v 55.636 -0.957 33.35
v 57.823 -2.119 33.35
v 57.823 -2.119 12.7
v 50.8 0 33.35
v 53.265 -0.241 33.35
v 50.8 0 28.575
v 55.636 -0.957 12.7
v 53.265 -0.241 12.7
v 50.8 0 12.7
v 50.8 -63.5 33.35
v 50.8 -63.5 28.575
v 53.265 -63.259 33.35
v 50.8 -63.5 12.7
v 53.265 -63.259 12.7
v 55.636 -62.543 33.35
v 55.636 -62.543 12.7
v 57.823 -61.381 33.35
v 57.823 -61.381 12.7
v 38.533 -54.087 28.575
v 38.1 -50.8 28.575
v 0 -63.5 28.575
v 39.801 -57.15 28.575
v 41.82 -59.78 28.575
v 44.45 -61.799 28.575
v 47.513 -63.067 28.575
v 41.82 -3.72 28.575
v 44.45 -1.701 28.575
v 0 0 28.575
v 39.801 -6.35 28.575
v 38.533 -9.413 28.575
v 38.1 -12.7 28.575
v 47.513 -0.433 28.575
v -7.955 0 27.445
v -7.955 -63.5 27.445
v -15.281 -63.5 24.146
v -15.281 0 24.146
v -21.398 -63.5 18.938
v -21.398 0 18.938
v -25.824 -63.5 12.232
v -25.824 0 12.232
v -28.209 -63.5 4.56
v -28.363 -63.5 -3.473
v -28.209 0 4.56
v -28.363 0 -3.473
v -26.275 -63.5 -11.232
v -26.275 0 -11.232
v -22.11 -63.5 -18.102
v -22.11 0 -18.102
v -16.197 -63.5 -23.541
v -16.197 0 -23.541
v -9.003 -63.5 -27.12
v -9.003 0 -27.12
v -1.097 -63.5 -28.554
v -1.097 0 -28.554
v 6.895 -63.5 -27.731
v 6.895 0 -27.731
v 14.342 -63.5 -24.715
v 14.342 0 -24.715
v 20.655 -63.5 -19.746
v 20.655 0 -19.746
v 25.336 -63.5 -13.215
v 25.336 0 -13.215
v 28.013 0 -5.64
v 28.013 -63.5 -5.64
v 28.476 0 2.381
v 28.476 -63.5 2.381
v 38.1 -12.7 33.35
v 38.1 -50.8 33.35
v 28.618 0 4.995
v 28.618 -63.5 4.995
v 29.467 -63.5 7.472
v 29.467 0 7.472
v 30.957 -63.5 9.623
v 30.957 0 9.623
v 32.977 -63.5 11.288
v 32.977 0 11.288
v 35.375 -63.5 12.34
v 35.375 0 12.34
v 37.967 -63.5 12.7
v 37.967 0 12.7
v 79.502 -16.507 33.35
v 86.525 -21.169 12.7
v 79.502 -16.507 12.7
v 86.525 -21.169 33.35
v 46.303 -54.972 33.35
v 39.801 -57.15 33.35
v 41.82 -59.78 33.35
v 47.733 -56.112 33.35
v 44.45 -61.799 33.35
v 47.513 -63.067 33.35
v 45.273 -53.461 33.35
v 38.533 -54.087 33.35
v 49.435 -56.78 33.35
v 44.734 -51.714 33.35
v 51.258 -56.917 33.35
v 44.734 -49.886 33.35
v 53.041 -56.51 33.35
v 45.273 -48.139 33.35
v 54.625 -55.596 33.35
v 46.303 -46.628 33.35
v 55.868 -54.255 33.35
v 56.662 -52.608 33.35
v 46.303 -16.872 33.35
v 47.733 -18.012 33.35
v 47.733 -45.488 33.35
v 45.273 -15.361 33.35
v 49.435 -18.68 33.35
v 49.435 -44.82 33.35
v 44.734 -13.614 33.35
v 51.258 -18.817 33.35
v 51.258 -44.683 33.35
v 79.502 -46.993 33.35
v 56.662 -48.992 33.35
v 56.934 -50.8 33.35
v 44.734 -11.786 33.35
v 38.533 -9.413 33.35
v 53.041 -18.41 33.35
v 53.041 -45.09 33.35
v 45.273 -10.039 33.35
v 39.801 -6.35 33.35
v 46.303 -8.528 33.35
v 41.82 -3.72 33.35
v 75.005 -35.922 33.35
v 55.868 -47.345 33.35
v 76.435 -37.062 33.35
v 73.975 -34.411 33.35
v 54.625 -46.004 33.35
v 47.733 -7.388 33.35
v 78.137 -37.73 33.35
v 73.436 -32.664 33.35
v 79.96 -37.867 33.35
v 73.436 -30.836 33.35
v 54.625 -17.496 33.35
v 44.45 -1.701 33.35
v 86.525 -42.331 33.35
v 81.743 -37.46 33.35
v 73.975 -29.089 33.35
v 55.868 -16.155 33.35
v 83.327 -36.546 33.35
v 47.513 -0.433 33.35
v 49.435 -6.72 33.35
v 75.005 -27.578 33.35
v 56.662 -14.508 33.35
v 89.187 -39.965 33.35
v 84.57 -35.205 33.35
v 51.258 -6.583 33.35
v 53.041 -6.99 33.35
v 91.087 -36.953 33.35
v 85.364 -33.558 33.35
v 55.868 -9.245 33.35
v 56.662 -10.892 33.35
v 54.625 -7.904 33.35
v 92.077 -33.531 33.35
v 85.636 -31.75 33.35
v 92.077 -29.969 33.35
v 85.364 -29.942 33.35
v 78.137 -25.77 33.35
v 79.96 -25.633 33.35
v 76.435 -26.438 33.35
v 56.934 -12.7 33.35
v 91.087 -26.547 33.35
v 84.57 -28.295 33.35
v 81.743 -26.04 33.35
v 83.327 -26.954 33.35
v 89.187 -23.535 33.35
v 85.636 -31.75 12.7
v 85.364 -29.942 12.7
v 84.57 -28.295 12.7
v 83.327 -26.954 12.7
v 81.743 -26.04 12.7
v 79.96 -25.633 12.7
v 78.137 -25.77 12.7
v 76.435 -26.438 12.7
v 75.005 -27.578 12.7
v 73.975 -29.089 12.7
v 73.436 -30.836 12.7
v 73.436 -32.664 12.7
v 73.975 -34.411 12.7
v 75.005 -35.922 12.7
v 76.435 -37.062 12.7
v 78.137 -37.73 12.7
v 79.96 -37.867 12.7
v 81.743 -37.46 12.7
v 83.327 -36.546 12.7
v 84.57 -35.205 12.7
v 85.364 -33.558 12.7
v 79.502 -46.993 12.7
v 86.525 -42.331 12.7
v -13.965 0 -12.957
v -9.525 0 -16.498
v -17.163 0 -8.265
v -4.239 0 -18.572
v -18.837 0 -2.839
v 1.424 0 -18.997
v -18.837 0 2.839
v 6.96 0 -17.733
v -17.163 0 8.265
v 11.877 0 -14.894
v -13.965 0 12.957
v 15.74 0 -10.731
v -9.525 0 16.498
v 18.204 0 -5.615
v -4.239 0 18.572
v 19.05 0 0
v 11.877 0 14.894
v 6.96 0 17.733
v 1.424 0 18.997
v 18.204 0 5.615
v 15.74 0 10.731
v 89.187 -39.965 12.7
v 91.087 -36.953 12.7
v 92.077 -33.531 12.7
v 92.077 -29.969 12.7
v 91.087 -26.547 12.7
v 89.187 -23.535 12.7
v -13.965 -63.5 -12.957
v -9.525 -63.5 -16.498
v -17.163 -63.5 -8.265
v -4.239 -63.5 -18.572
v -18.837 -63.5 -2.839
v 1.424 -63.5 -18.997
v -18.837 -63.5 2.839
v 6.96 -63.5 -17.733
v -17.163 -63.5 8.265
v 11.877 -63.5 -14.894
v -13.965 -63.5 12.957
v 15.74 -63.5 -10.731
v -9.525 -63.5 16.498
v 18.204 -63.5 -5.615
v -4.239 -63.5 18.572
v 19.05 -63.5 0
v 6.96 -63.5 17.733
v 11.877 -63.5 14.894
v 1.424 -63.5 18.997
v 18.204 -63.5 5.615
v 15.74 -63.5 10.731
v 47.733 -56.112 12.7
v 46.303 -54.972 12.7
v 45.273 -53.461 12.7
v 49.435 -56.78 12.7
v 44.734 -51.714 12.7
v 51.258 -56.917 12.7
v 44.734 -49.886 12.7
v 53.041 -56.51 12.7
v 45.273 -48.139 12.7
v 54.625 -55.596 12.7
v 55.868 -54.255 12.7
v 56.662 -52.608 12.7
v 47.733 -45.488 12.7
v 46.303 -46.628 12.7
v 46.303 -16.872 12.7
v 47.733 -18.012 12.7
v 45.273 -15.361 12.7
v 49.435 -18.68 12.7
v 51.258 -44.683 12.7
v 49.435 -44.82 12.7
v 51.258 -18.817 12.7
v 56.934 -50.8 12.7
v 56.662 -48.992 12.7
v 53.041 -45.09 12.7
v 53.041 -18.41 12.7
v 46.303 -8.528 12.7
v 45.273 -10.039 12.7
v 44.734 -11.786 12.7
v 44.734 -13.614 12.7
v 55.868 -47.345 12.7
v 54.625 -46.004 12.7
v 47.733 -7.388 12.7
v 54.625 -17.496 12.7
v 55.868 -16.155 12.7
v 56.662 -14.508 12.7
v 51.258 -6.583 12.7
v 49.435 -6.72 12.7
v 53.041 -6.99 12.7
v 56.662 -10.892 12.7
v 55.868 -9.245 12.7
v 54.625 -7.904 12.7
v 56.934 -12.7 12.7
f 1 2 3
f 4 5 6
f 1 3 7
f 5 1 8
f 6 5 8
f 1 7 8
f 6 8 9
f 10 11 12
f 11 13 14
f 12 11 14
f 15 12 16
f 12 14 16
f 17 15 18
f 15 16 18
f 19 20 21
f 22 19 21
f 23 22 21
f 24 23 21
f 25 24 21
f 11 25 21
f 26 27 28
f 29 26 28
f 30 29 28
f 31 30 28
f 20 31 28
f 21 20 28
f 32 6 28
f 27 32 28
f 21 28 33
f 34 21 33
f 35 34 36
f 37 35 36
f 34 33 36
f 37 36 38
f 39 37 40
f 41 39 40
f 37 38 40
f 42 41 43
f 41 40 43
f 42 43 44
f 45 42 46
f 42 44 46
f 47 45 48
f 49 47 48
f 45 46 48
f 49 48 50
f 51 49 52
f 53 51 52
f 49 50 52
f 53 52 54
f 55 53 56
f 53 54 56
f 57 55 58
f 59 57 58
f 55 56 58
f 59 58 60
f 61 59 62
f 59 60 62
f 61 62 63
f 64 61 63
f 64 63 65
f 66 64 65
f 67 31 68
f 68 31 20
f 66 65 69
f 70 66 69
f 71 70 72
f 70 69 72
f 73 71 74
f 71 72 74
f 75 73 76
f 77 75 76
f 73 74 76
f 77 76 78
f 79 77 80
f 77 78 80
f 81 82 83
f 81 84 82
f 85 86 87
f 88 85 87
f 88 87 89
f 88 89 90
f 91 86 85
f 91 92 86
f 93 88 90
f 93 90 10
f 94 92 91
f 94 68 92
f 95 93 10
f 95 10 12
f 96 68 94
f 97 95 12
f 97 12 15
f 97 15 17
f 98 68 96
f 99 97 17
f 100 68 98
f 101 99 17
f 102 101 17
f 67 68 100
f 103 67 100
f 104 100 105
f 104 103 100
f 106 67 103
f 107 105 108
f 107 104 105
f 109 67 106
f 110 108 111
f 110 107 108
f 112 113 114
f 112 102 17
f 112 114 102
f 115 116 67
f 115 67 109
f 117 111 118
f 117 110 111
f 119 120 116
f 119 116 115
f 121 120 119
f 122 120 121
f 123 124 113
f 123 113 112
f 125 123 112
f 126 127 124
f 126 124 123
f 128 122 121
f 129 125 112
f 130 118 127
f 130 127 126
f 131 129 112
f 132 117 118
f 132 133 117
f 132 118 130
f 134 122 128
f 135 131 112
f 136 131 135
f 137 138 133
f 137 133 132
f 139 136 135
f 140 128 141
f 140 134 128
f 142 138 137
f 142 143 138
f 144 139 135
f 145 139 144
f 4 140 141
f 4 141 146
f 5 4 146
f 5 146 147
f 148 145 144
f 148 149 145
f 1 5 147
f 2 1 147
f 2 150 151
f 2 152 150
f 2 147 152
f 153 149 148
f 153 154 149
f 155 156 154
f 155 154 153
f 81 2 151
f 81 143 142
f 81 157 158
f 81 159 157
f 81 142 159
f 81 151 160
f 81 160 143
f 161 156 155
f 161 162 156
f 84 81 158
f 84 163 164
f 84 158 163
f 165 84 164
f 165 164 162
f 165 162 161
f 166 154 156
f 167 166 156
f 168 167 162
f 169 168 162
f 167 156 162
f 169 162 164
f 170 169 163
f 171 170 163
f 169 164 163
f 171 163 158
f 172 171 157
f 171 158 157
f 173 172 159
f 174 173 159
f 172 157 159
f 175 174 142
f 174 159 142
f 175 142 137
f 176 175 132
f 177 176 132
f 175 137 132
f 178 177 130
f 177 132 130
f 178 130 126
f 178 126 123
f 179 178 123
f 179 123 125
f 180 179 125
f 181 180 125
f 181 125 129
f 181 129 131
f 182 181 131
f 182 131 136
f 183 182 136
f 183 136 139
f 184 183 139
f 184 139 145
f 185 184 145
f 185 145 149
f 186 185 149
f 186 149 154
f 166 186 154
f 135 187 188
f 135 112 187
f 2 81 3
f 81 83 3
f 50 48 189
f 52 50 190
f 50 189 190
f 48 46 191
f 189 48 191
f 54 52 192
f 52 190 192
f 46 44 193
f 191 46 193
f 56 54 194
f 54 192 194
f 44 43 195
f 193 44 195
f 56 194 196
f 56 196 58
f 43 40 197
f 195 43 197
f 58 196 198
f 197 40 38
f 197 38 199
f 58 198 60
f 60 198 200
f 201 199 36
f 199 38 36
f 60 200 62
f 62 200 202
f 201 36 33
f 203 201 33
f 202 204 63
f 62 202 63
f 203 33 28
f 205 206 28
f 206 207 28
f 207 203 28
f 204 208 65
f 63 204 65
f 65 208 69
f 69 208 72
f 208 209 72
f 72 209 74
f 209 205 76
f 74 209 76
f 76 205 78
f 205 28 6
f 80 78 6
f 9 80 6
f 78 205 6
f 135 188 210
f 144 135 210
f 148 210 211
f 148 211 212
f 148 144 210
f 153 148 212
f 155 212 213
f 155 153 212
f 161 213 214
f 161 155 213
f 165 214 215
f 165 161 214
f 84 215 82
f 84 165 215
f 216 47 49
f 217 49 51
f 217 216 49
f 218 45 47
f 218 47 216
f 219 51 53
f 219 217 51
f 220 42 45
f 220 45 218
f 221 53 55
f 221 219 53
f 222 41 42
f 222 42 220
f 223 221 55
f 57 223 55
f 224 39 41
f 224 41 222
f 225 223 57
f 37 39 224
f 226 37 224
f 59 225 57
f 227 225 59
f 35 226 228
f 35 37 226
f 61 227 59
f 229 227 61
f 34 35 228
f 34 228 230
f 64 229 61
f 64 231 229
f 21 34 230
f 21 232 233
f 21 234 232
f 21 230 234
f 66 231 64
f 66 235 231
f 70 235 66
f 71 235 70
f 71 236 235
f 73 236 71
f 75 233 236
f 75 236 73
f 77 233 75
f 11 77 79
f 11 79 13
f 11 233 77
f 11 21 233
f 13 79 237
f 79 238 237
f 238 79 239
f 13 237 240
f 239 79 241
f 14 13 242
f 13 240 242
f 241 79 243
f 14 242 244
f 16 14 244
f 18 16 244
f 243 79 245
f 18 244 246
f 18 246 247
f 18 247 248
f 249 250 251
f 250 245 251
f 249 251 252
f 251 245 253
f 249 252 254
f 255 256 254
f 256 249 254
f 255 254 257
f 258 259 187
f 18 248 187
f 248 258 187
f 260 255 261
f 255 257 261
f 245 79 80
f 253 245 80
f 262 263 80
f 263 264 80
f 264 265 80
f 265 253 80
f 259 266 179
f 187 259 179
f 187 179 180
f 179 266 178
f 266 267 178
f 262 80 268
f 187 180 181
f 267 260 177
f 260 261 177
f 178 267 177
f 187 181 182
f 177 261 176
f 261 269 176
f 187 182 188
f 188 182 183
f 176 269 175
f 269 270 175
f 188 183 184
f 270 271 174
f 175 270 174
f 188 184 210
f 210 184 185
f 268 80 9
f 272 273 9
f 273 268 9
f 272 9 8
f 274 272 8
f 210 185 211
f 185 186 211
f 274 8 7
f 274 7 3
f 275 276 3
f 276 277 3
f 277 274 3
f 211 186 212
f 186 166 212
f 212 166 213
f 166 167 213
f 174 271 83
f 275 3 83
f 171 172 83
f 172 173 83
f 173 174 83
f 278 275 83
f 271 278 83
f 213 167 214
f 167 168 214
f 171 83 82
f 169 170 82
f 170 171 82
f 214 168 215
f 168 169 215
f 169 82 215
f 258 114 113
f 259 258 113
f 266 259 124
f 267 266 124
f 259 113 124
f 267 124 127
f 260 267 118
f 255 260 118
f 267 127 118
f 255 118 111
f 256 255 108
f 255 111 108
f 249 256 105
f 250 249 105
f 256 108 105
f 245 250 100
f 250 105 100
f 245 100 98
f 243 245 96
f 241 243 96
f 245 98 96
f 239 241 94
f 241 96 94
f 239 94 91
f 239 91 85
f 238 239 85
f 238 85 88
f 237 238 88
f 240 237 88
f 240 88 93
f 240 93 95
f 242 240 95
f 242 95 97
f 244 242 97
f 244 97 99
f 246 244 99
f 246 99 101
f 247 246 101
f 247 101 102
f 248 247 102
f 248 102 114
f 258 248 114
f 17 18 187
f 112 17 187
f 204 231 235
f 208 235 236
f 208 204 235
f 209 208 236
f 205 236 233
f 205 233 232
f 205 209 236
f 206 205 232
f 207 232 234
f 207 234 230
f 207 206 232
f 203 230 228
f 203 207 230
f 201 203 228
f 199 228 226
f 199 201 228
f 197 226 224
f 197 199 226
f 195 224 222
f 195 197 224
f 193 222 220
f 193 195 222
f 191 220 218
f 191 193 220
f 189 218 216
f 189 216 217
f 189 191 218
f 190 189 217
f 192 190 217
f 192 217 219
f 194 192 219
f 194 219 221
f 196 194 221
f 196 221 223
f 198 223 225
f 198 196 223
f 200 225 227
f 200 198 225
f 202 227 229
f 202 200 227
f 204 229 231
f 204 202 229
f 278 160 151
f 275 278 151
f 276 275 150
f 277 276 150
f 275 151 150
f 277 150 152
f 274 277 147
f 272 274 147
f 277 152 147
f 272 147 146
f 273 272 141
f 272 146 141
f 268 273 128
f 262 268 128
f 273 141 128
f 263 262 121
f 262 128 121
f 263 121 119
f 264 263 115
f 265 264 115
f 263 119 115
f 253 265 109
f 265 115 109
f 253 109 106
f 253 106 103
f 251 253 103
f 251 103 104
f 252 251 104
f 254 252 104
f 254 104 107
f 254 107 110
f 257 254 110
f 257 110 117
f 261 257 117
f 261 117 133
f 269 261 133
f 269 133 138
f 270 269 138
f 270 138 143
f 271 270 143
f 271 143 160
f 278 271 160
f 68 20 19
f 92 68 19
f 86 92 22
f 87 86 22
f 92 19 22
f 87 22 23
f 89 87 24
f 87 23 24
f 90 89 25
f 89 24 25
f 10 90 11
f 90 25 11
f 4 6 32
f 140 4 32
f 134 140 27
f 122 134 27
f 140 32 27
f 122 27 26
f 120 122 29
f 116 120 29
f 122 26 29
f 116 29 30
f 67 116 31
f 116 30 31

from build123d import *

# Parameters (mm, degrees)
F0_R     = 19.05
F1_DEPTH = 63.5
F2_DEPTH = 63.5
F4_DEPTH = 4.7752
F5_DEPTH = 25.4
F6_DEPTH = 15.875
F7_R     = 6.1341
F8_DEPTH = 25.4


with BuildPart() as f1:
    # F0 (on Front) → F1 (new body)
    with BuildSketch(Plane.XZ):
        with BuildLine():
            Line((79.502, 28.575), (0, 28.575))
            ThreePointArc((0, 28.575), (-19.345366451, -21.0306305629), (28.4756083945, 2.38125))
            ThreePointArc((28.4756083945, 2.38125), (30.9572676717, 9.6234554837), (37.9674778593, 12.7))
            Line((37.9674778593, 12.7), (79.502, 12.7))
            Line((79.502, 12.7), (79.502, 28.575))
        make_face()
        Circle(F0_R, mode=Mode.SUBTRACT)
    extrude(amount=F1_DEPTH)

    # F0 (on Front) → F2 (join)
    with BuildSketch(Plane.XZ):
        with BuildLine():
            Line((79.502, 28.575), (0, 28.575))
            ThreePointArc((0, 28.575), (-19.345366451, -21.0306305629), (28.4756083945, 2.38125))
            ThreePointArc((28.4756083945, 2.38125), (30.9572676717, 9.6234554837), (37.9674778593, 12.7))
            Line((37.9674778593, 12.7), (79.502, 12.7))
            Line((79.502, 12.7), (79.502, 28.575))
        make_face()
        Circle(F0_R, mode=Mode.SUBTRACT)
    extrude(amount=F2_DEPTH)

    # F3 (on face) → F4 (join)
    with BuildSketch(Plane.XY.offset(28.575)):
        with BuildLine():
            ThreePointArc((86.5250683207, -42.3314229366), (83.1698282884, -43.9088254222), (79.502, -44.45))
            Line((79.502, -44.45), (79.502, -46.992751468))
            Line((79.502, -46.992751468), (86.5250683207, -42.3314229366))
        make_face()
        with BuildLine():
            Line((86.5250683207, -21.1685770634), (79.502, -16.507248532))
            Line((79.502, -16.507248532), (79.502, -19.05))
            ThreePointArc((79.502, -19.05), (83.1698282884, -19.5911745778), (86.5250683207, -21.1685770634))
        make_face()
        with BuildLine():
            ThreePointArc((86.5250683207, -21.1685770634), (83.1698282884, -19.5911745778), (79.502, -19.05))
            Line((79.502, -19.05), (79.502, -44.45))
            ThreePointArc((79.502, -44.45), (83.1698282884, -43.9088254222), (86.5250683207, -42.3314229366))
            ThreePointArc((86.5250683207, -42.3314229366), (92.202, -31.75), (86.5250683207, -21.1685770634))
        make_face()
        with BuildLine():
            ThreePointArc((57.8230683207, -2.1185770634), (54.467828274, -0.5411745735), (50.7999999699, 0))
            ThreePointArc((50.7999999699, 0), (41.8197438683, -3.7197438896), (38.1, -12.7))
            Line((38.1, -12.7), (38.1, -50.8))
            ThreePointArc((38.1, -50.8), (41.8197438789, -59.7802561211), (50.8, -63.5))
            ThreePointArc((50.8, -63.5), (54.4678282884, -62.9588254222), (57.8230683207, -61.3814229366))
            Line((57.8230683207, -61.3814229366), (79.502, -46.992751468))
            Line((79.502, -46.992751468), (79.502, -44.45))
            Line((79.502, -44.45), (79.502, -19.05))
            Line((79.502, -19.05), (79.502, -16.507248532))
            Line((79.502, -16.507248532), (57.8230683207, -2.1185770634))
        make_face()
    extrude(amount=F4_DEPTH)

    # F5 (cut): faces of the model
    f5_faces = [f1.faces().sort_by_distance(p)[0] for p in [
        (71.0984865621, -5.4680526569, 28.575),
        (71.0984865621, -58.0319473431, 28.575),
    ]]
    extrude(f5_faces, amount=-F5_DEPTH, mode=Mode.SUBTRACT)

    # F6 (add): a face of the model
    f6_faces = [f1.faces().sort_by_distance(p)[0] for p in [
        (84.7235761058, -31.75, 28.575),
    ]]
    extrude(f6_faces, amount=F6_DEPTH)

    # F7 (on face) → F8 (cut)
    with BuildSketch(Plane.XY.offset(33.3502)):
        with Locations((50.8, -12.7)):
            Circle(F7_R)
        with Locations((79.502, -31.75)):
            Circle(F7_R)
        with Locations((50.8, -50.8)):
            Circle(F7_R)
    extrude(amount=-F8_DEPTH, mode=Mode.SUBTRACT)


solid = f1.part
